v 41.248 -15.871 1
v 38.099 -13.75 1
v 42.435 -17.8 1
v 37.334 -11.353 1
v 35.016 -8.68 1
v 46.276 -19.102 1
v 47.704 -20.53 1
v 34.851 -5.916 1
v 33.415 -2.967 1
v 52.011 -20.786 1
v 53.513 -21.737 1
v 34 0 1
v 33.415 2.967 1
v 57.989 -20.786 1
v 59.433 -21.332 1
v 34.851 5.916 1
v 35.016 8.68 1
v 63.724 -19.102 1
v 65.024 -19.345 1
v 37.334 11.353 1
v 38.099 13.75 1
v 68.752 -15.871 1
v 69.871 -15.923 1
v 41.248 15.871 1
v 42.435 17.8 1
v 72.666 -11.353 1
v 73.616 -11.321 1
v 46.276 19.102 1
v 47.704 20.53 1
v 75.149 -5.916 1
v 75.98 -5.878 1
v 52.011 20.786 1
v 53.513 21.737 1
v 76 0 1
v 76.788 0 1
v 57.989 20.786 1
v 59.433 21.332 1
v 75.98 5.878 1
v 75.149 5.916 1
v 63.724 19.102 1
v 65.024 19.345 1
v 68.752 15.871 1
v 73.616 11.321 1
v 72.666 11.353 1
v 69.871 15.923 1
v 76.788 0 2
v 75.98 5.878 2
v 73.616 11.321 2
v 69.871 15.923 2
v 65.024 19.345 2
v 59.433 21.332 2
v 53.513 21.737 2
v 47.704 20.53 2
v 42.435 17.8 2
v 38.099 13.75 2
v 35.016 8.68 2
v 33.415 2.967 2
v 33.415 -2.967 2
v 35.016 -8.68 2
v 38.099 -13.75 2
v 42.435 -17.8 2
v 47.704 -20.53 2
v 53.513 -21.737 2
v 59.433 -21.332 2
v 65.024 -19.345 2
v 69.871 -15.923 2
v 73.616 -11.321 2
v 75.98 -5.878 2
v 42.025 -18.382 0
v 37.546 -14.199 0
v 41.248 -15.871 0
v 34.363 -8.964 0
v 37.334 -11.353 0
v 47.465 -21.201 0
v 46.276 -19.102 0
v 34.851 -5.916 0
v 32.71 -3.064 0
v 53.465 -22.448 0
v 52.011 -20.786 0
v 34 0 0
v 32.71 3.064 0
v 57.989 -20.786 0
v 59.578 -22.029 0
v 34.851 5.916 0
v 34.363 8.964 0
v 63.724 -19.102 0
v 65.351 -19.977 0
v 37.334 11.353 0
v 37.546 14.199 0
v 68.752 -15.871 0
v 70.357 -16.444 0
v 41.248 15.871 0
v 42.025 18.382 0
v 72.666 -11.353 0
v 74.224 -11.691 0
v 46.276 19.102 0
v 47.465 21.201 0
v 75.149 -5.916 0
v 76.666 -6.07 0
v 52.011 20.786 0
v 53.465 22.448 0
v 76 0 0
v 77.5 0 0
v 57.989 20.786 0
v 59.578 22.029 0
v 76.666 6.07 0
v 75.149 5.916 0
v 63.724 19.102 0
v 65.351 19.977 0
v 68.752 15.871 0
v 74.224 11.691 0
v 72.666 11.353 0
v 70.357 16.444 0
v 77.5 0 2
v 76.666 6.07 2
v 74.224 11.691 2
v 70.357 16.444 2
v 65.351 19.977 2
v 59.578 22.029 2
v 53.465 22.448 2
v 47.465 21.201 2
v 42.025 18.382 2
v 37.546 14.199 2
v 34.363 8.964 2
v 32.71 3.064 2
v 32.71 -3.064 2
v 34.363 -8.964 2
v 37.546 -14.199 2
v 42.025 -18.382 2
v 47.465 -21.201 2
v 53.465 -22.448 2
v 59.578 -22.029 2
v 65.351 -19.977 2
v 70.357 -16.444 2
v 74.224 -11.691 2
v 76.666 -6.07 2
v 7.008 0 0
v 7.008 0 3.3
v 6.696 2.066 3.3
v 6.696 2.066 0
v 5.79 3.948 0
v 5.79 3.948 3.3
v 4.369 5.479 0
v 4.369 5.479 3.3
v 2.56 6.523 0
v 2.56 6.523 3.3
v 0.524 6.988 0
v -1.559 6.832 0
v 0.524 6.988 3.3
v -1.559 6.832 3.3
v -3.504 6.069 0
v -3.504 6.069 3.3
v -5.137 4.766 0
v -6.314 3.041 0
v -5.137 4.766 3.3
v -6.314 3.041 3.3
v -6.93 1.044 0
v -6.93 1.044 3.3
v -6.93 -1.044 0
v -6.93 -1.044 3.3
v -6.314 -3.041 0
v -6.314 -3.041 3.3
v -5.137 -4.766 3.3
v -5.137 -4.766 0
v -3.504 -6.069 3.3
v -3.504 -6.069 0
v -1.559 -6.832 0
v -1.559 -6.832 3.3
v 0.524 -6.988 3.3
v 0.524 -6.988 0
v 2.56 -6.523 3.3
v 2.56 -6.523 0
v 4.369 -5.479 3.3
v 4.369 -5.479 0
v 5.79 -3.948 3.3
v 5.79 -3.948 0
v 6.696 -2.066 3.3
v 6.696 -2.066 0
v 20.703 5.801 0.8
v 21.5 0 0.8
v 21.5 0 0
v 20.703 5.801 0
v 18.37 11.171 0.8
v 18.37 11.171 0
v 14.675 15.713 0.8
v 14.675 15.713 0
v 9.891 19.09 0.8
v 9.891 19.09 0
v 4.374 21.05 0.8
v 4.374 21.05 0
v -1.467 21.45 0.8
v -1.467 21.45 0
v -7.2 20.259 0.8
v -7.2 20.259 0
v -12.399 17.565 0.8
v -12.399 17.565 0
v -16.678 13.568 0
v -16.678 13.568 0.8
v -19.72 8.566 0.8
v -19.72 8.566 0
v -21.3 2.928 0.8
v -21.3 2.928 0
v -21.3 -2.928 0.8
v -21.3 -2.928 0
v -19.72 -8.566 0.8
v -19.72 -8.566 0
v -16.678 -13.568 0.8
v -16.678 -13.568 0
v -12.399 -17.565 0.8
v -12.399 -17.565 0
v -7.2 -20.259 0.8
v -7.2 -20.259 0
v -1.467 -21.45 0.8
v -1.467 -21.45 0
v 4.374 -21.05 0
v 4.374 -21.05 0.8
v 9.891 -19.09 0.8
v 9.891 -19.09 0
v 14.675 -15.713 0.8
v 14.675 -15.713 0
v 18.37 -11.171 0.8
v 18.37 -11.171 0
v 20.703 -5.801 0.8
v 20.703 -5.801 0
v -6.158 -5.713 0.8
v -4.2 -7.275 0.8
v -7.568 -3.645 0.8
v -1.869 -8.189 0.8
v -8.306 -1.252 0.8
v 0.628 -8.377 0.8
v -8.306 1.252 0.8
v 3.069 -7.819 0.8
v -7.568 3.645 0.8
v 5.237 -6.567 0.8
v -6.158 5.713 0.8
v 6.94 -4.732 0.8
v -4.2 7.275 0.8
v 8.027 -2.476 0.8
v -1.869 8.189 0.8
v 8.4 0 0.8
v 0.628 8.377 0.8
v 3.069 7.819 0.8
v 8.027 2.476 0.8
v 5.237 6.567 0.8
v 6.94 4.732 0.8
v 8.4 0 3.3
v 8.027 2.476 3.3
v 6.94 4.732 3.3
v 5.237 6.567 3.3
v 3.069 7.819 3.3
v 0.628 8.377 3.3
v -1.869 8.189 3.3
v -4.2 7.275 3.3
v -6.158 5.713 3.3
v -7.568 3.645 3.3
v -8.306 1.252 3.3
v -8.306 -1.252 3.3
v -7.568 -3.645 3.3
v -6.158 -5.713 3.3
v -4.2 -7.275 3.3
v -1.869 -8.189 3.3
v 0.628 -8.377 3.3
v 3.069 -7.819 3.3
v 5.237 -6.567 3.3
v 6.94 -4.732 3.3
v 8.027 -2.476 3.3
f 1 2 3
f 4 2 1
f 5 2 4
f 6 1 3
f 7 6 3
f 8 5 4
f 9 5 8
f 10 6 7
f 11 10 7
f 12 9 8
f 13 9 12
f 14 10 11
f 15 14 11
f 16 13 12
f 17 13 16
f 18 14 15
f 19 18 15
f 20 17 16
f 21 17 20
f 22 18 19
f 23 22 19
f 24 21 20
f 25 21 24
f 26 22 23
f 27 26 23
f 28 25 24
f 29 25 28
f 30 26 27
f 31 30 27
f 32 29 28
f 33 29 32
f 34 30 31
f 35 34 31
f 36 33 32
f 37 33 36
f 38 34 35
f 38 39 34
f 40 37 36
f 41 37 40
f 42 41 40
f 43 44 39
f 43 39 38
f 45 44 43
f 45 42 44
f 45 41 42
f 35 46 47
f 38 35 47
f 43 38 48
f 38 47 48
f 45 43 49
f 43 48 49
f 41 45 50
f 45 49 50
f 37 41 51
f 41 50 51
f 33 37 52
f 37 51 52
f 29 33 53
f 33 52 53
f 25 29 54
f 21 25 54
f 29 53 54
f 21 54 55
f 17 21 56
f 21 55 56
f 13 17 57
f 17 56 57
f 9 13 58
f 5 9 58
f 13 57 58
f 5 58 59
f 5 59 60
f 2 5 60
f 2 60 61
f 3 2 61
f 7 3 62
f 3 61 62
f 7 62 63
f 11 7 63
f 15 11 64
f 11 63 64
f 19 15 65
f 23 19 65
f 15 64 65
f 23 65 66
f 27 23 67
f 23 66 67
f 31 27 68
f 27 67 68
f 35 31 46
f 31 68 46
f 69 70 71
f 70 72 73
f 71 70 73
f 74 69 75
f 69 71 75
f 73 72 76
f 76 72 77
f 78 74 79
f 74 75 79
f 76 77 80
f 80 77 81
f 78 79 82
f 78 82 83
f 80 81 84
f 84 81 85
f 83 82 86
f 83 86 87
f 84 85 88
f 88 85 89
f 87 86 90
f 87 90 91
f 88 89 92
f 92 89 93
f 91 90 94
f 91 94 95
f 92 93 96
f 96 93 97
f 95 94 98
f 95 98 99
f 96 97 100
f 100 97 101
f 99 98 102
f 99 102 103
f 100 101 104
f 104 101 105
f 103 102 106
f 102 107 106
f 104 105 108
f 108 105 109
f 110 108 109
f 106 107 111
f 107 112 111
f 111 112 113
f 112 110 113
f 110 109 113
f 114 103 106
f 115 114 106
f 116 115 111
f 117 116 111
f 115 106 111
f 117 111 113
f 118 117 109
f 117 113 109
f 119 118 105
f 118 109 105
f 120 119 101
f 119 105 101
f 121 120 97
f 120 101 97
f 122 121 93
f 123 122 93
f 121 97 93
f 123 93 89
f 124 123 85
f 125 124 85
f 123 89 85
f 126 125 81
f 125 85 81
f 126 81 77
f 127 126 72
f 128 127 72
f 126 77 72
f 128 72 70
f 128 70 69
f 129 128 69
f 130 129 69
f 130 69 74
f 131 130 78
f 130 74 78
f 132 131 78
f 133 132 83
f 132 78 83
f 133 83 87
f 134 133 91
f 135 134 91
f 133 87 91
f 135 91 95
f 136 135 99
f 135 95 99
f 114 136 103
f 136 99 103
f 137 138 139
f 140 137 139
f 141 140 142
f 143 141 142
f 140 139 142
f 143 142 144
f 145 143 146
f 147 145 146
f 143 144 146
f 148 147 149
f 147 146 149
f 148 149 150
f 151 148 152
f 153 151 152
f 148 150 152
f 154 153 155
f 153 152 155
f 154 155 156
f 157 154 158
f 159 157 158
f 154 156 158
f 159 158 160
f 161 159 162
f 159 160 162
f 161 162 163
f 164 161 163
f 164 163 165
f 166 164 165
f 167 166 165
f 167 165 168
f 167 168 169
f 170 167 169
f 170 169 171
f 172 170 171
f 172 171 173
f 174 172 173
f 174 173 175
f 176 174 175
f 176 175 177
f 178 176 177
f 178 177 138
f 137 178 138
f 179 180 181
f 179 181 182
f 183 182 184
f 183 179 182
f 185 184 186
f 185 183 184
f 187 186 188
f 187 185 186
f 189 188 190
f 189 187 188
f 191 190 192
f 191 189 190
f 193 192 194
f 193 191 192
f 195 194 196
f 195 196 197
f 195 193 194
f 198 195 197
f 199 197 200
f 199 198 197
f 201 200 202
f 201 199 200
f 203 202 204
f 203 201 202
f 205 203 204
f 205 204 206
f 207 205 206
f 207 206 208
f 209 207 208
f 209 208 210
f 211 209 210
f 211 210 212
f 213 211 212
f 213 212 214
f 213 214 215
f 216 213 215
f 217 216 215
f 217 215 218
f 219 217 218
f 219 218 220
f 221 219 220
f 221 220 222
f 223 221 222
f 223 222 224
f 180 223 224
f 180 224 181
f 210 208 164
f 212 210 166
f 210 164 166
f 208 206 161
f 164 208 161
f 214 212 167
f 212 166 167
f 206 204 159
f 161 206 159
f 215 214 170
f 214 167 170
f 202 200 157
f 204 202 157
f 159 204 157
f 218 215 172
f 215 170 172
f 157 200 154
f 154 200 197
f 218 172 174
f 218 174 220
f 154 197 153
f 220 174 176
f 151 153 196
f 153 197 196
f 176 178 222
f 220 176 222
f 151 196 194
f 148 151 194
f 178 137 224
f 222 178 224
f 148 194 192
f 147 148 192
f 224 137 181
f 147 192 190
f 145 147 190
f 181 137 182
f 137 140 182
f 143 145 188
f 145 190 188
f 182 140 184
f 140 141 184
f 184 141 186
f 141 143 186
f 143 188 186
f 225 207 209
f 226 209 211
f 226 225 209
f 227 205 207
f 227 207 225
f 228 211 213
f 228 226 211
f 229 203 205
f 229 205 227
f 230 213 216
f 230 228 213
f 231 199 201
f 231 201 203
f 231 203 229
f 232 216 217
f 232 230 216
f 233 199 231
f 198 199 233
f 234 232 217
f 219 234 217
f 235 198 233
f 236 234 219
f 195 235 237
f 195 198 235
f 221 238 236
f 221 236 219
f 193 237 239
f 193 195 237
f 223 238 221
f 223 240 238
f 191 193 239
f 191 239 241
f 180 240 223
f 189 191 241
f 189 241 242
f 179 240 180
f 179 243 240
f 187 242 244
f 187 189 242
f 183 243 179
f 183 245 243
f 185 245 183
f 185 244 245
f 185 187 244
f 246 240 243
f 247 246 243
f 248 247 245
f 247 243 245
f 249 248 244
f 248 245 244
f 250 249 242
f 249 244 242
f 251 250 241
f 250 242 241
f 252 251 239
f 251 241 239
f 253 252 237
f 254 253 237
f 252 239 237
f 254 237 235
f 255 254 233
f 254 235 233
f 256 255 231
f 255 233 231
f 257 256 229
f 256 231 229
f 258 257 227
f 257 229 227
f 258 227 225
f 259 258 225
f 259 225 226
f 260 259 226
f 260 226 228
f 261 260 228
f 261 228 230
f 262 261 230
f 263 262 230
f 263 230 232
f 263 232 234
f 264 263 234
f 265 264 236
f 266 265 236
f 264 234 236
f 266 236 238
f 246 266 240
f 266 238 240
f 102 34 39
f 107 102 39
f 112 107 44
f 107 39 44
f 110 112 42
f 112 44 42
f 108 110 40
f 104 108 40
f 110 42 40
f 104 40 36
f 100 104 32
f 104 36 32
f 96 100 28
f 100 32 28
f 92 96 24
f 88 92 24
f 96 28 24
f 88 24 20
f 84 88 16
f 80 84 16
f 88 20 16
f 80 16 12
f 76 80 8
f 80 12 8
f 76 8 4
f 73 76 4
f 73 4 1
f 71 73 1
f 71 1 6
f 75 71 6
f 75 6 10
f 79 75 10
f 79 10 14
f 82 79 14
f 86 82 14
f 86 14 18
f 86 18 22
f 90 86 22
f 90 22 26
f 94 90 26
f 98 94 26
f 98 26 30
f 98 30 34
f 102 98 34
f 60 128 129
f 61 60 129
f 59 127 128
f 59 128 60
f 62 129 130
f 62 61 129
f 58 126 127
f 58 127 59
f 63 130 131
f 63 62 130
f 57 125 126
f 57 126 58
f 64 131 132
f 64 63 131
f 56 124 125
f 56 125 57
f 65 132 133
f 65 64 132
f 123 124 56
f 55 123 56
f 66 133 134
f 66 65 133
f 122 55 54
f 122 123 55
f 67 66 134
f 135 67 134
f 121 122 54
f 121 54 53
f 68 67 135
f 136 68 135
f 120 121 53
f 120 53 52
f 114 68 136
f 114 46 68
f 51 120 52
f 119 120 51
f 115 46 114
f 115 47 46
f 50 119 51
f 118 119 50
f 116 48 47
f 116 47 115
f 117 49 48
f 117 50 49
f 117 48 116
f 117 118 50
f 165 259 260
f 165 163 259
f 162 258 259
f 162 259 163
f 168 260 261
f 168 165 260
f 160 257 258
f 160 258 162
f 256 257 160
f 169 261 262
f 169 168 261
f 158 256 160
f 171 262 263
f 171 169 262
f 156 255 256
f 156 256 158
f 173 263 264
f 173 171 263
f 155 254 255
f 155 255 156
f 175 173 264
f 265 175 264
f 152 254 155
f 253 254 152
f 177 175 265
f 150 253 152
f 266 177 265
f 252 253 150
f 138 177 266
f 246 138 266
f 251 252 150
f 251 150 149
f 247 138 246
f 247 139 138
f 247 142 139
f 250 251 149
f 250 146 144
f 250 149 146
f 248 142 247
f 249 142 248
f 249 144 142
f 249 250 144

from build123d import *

# Parameters (mm, degrees)
SKETCH_R        = 24.3
PAD_DEPTH       = 0.8
SKETCH001_R     = 8.4
PAD001_DEPTH    = 2.5
SKETCH002_R     = 7.007775
POCKET_DEPTH    = 3.301
SKETCH003_R     = 31.153202
SKETCH003_R_2   = 21.5
POCKET001_DEPTH = 5
SKETCH004_R     = 22.5
PAD002_DEPTH    = 2
SKETCH005_R     = 21.787651
POCKET002_DEPTH = 1
SKETCH006_R     = 21
POCKET003_DEPTH = 5


with BuildPart() as body:
    # Sketch → Pad (new body)
    with BuildSketch(Plane.XY):
        Circle(SKETCH_R)
    extrude(amount=PAD_DEPTH)

    # Sketch001 (on Face3 of Pad) → Pad001 (join)
    with BuildSketch(Plane.XY.offset(0.8)):
        Circle(SKETCH001_R)
    extrude(amount=PAD001_DEPTH)

    # Sketch002 (on Face5 of Pad001) → Pocket (cut, through all)
    with BuildSketch(Plane.XY.offset(3.3)):
        Circle(SKETCH002_R)
    extrude(amount=-POCKET_DEPTH, mode=Mode.SUBTRACT)

    # Sketch003 (on Face3 of Pocket) → Pocket001 (cut)
    with BuildSketch(Plane.XY.offset(0.8)):
        Circle(SKETCH003_R)
        Circle(SKETCH003_R_2, mode=Mode.SUBTRACT)
    extrude(amount=-POCKET001_DEPTH, mode=Mode.SUBTRACT)


with BuildPart() as body001:
    # Sketch004 → Pad002 (new body)
    with BuildSketch(Plane.XY):
        with Locations((55, 0)):
            Circle(SKETCH004_R)
    extrude(amount=PAD002_DEPTH)

    # Sketch005 (on Face3 of Pad002) → Pocket002 (cut)
    with BuildSketch(Plane.XY.offset(2)):
        with Locations((55, 0)):
            Circle(SKETCH005_R)
    extrude(amount=-POCKET002_DEPTH, mode=Mode.SUBTRACT)

    # Sketch006 (on Face5 of Pocket002) → Pocket003 (cut)
    with BuildSketch(Plane.XY.offset(1)):
        with Locations((55, 0)):
            Circle(SKETCH006_R)
    extrude(amount=-POCKET003_DEPTH, mode=Mode.SUBTRACT)


solid = Compound([body.part, body001.part])
